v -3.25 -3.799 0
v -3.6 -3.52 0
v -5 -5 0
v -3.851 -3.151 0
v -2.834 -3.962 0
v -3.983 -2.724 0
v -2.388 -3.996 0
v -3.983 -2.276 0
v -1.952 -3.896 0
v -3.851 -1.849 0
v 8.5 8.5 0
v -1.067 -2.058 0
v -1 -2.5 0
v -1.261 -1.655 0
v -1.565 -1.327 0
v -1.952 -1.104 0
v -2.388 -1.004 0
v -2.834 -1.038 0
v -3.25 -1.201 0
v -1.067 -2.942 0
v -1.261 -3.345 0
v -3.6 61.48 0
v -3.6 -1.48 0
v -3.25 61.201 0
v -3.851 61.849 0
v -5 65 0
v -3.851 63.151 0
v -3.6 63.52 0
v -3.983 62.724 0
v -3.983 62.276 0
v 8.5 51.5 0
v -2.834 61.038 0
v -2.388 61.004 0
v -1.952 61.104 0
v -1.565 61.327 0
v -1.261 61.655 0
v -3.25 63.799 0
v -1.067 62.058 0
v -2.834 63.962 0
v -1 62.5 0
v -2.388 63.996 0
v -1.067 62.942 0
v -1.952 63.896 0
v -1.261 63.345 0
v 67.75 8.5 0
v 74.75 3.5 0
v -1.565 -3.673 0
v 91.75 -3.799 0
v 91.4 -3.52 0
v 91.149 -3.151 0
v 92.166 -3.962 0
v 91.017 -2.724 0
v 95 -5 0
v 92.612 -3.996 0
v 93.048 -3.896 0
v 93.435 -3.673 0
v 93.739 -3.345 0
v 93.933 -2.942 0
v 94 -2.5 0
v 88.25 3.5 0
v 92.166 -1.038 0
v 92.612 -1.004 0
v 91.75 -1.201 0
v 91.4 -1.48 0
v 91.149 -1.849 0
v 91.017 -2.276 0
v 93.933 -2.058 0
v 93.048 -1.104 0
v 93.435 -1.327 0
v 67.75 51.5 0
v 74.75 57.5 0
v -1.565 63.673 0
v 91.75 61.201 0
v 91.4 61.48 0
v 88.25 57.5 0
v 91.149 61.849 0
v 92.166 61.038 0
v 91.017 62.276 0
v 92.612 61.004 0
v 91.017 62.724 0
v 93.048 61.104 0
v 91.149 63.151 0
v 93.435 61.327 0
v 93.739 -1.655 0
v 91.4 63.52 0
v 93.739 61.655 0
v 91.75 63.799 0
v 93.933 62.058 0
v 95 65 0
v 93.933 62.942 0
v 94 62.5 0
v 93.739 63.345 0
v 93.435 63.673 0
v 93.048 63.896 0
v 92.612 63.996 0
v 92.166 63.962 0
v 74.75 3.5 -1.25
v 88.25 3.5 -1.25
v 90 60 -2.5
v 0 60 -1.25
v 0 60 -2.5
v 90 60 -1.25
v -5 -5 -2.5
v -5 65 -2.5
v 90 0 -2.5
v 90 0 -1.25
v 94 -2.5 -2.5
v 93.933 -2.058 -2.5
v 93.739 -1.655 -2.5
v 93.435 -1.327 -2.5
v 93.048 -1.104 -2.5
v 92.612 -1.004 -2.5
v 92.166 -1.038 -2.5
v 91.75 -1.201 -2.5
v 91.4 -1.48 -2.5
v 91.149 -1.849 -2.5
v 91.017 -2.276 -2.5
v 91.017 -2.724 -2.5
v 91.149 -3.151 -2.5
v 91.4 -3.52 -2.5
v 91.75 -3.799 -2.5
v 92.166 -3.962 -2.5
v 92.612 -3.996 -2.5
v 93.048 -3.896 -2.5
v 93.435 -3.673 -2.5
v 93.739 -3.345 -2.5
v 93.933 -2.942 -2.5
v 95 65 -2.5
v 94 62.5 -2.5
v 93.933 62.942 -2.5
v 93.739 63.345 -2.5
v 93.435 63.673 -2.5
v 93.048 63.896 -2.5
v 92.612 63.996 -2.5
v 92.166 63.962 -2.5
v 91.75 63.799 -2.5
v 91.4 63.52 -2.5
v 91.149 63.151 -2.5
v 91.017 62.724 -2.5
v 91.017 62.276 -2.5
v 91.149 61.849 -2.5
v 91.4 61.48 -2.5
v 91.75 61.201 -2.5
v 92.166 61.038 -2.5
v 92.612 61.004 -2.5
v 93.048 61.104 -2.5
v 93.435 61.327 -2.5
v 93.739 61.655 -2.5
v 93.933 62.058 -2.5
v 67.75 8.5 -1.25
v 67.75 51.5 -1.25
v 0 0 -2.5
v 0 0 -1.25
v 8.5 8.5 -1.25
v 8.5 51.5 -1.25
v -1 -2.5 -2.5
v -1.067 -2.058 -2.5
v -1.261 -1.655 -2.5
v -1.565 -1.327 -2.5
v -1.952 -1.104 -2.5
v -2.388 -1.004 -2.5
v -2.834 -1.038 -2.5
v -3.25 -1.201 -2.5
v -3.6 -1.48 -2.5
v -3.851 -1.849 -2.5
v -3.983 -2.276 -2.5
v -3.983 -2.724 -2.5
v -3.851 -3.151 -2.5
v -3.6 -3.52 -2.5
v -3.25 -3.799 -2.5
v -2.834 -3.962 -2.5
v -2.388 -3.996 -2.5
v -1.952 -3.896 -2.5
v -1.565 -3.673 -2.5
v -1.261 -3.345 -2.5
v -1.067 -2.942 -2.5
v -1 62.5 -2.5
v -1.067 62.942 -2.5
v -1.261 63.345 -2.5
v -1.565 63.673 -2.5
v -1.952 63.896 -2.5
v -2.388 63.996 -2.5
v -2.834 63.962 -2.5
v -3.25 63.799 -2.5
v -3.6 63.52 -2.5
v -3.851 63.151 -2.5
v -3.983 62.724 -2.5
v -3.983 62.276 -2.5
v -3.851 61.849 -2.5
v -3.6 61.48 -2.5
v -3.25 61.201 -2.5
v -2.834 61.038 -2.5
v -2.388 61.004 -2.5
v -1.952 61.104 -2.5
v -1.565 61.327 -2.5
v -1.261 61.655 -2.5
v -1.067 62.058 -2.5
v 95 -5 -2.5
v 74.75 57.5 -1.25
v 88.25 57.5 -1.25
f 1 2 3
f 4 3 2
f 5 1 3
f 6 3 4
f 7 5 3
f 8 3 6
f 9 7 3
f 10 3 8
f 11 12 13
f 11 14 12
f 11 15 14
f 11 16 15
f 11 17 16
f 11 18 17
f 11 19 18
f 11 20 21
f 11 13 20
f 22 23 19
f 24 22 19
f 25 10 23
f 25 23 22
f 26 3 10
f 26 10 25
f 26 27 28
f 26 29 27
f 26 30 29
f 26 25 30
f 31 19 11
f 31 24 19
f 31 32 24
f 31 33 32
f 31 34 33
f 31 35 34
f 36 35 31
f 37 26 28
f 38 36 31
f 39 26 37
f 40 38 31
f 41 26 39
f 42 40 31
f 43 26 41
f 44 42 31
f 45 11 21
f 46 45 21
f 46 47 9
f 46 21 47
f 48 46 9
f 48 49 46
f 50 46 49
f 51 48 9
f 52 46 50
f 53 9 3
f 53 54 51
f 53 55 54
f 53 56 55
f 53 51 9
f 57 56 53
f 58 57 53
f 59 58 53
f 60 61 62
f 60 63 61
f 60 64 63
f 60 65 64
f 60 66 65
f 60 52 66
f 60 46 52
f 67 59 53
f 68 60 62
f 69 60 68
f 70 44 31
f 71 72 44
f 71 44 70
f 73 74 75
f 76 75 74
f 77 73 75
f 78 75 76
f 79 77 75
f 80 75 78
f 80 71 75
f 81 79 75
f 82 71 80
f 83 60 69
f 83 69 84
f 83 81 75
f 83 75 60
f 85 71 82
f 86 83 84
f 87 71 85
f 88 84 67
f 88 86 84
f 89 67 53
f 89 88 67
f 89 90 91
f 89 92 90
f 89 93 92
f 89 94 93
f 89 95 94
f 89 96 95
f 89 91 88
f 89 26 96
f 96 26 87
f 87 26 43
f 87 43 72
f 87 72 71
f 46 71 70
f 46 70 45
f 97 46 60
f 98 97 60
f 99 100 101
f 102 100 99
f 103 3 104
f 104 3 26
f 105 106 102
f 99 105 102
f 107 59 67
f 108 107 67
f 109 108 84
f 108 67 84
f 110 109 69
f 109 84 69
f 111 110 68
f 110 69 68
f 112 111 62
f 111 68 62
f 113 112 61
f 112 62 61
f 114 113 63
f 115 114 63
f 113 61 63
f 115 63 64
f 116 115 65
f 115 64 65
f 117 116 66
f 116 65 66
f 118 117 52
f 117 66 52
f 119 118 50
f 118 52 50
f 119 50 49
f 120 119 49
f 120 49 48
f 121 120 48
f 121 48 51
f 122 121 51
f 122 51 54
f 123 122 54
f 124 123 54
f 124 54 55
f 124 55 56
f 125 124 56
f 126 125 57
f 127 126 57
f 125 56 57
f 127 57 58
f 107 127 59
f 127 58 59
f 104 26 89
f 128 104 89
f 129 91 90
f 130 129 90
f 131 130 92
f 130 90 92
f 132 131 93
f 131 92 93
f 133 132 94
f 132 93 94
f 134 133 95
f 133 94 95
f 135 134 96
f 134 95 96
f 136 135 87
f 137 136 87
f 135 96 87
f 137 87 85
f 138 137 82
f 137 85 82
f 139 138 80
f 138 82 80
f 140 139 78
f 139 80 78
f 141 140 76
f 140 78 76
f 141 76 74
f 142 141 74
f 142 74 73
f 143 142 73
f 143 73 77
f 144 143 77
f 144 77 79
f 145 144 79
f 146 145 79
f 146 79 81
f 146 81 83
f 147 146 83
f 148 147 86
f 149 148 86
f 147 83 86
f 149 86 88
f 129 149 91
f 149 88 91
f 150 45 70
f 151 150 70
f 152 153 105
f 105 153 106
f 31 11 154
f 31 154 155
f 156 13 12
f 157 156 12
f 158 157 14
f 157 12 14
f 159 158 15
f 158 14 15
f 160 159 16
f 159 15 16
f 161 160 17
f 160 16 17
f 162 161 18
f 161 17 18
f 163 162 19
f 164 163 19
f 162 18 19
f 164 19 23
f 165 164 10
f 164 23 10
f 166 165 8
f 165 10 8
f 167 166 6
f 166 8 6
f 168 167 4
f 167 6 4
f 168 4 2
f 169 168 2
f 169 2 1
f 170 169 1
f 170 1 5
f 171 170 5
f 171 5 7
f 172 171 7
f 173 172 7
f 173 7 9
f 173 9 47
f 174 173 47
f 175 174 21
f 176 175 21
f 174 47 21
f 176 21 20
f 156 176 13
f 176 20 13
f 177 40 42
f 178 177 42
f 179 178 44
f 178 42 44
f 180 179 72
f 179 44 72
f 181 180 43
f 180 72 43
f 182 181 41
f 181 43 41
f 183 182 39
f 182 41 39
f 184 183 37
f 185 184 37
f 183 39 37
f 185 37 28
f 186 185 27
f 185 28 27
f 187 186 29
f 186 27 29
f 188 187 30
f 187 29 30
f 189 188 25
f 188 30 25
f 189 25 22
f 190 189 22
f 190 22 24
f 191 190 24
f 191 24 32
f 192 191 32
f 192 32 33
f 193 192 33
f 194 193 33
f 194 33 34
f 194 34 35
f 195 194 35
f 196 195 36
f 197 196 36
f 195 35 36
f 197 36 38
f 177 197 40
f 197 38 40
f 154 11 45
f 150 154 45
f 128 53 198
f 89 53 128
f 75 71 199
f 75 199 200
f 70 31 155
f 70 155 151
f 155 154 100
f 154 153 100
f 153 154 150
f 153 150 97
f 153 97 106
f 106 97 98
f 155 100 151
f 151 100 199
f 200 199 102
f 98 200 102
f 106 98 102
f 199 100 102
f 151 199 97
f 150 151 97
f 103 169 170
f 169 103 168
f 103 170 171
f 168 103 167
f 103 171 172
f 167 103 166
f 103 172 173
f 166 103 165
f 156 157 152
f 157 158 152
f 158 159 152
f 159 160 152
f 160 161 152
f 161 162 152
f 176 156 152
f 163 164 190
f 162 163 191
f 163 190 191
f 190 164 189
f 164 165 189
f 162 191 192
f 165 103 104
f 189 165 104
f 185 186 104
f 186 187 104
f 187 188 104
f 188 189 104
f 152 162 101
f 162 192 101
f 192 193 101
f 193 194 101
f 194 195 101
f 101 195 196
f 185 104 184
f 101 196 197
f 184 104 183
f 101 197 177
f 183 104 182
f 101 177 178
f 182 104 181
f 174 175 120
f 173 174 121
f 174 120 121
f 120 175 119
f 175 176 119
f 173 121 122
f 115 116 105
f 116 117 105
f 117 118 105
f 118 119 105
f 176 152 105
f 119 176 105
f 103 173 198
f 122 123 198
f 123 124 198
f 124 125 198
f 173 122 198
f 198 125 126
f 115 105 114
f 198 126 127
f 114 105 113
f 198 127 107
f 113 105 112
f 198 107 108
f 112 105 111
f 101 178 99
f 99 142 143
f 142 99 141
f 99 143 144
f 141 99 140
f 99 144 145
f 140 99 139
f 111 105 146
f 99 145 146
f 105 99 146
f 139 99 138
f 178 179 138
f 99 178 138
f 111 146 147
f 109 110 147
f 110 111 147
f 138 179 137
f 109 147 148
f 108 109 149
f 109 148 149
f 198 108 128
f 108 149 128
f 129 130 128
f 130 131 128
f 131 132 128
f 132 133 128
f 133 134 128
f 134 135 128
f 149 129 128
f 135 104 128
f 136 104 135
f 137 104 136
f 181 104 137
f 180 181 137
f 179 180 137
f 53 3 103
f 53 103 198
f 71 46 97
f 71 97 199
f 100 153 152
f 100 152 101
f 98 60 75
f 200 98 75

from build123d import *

# Parameters (mm, degrees)
SKETCH1_W           = 90
SKETCH1_H           = 60
SKETCH1_W_2         = 59.25
SKETCH1_H_2         = 43
BOSS_EXTRUDE3_DEPTH = 1.25
SKETCH1_6_W         = 100
SKETCH1_6_H         = 70
SKETCH1_6_R         = 1.5
SKETCH1_6_W_2       = 90
SKETCH1_6_H_2       = 60
BOSS_EXTRUDE4_DEPTH = 2.5


with BuildPart() as part:
    # Sketch1 → Boss-Extrude3 (new body)
    with BuildSketch(Plane.XY):
        with Locations((45, 30)):
            Rectangle(SKETCH1_W, SKETCH1_H)
        with Locations((38.125, 30)):
            Rectangle(SKETCH1_W_2, SKETCH1_H_2, mode=Mode.SUBTRACT)
        Polygon((74.75, 3.5), (74.75, 54.5), (74.75, 57.5), (88.25, 57.5), (88.25, 3.5), align=None, mode=Mode.SUBTRACT)
    extrude(amount=-BOSS_EXTRUDE3_DEPTH)

    # Sketch1<6> → Boss-Extrude4 (add)
    with BuildSketch(Plane.XY):
        with Locations((45, 30)):
            Rectangle(SKETCH1_6_W, SKETCH1_6_H)
        with Locations((-2.5, -2.5)):
            Circle(SKETCH1_6_R, mode=Mode.SUBTRACT)
        with Locations((92.5, -2.5)):
            Circle(SKETCH1_6_R, mode=Mode.SUBTRACT)
        with Locations((45, 30)):
            Rectangle(SKETCH1_6_W_2, SKETCH1_6_H_2, mode=Mode.SUBTRACT)
        with Locations((-2.5, 62.5)):
            Circle(SKETCH1_6_R, mode=Mode.SUBTRACT)
        with Locations((92.5, 62.5)):
            Circle(SKETCH1_6_R, mode=Mode.SUBTRACT)
    extrude(amount=-BOSS_EXTRUDE4_DEPTH)


solid = part.part
